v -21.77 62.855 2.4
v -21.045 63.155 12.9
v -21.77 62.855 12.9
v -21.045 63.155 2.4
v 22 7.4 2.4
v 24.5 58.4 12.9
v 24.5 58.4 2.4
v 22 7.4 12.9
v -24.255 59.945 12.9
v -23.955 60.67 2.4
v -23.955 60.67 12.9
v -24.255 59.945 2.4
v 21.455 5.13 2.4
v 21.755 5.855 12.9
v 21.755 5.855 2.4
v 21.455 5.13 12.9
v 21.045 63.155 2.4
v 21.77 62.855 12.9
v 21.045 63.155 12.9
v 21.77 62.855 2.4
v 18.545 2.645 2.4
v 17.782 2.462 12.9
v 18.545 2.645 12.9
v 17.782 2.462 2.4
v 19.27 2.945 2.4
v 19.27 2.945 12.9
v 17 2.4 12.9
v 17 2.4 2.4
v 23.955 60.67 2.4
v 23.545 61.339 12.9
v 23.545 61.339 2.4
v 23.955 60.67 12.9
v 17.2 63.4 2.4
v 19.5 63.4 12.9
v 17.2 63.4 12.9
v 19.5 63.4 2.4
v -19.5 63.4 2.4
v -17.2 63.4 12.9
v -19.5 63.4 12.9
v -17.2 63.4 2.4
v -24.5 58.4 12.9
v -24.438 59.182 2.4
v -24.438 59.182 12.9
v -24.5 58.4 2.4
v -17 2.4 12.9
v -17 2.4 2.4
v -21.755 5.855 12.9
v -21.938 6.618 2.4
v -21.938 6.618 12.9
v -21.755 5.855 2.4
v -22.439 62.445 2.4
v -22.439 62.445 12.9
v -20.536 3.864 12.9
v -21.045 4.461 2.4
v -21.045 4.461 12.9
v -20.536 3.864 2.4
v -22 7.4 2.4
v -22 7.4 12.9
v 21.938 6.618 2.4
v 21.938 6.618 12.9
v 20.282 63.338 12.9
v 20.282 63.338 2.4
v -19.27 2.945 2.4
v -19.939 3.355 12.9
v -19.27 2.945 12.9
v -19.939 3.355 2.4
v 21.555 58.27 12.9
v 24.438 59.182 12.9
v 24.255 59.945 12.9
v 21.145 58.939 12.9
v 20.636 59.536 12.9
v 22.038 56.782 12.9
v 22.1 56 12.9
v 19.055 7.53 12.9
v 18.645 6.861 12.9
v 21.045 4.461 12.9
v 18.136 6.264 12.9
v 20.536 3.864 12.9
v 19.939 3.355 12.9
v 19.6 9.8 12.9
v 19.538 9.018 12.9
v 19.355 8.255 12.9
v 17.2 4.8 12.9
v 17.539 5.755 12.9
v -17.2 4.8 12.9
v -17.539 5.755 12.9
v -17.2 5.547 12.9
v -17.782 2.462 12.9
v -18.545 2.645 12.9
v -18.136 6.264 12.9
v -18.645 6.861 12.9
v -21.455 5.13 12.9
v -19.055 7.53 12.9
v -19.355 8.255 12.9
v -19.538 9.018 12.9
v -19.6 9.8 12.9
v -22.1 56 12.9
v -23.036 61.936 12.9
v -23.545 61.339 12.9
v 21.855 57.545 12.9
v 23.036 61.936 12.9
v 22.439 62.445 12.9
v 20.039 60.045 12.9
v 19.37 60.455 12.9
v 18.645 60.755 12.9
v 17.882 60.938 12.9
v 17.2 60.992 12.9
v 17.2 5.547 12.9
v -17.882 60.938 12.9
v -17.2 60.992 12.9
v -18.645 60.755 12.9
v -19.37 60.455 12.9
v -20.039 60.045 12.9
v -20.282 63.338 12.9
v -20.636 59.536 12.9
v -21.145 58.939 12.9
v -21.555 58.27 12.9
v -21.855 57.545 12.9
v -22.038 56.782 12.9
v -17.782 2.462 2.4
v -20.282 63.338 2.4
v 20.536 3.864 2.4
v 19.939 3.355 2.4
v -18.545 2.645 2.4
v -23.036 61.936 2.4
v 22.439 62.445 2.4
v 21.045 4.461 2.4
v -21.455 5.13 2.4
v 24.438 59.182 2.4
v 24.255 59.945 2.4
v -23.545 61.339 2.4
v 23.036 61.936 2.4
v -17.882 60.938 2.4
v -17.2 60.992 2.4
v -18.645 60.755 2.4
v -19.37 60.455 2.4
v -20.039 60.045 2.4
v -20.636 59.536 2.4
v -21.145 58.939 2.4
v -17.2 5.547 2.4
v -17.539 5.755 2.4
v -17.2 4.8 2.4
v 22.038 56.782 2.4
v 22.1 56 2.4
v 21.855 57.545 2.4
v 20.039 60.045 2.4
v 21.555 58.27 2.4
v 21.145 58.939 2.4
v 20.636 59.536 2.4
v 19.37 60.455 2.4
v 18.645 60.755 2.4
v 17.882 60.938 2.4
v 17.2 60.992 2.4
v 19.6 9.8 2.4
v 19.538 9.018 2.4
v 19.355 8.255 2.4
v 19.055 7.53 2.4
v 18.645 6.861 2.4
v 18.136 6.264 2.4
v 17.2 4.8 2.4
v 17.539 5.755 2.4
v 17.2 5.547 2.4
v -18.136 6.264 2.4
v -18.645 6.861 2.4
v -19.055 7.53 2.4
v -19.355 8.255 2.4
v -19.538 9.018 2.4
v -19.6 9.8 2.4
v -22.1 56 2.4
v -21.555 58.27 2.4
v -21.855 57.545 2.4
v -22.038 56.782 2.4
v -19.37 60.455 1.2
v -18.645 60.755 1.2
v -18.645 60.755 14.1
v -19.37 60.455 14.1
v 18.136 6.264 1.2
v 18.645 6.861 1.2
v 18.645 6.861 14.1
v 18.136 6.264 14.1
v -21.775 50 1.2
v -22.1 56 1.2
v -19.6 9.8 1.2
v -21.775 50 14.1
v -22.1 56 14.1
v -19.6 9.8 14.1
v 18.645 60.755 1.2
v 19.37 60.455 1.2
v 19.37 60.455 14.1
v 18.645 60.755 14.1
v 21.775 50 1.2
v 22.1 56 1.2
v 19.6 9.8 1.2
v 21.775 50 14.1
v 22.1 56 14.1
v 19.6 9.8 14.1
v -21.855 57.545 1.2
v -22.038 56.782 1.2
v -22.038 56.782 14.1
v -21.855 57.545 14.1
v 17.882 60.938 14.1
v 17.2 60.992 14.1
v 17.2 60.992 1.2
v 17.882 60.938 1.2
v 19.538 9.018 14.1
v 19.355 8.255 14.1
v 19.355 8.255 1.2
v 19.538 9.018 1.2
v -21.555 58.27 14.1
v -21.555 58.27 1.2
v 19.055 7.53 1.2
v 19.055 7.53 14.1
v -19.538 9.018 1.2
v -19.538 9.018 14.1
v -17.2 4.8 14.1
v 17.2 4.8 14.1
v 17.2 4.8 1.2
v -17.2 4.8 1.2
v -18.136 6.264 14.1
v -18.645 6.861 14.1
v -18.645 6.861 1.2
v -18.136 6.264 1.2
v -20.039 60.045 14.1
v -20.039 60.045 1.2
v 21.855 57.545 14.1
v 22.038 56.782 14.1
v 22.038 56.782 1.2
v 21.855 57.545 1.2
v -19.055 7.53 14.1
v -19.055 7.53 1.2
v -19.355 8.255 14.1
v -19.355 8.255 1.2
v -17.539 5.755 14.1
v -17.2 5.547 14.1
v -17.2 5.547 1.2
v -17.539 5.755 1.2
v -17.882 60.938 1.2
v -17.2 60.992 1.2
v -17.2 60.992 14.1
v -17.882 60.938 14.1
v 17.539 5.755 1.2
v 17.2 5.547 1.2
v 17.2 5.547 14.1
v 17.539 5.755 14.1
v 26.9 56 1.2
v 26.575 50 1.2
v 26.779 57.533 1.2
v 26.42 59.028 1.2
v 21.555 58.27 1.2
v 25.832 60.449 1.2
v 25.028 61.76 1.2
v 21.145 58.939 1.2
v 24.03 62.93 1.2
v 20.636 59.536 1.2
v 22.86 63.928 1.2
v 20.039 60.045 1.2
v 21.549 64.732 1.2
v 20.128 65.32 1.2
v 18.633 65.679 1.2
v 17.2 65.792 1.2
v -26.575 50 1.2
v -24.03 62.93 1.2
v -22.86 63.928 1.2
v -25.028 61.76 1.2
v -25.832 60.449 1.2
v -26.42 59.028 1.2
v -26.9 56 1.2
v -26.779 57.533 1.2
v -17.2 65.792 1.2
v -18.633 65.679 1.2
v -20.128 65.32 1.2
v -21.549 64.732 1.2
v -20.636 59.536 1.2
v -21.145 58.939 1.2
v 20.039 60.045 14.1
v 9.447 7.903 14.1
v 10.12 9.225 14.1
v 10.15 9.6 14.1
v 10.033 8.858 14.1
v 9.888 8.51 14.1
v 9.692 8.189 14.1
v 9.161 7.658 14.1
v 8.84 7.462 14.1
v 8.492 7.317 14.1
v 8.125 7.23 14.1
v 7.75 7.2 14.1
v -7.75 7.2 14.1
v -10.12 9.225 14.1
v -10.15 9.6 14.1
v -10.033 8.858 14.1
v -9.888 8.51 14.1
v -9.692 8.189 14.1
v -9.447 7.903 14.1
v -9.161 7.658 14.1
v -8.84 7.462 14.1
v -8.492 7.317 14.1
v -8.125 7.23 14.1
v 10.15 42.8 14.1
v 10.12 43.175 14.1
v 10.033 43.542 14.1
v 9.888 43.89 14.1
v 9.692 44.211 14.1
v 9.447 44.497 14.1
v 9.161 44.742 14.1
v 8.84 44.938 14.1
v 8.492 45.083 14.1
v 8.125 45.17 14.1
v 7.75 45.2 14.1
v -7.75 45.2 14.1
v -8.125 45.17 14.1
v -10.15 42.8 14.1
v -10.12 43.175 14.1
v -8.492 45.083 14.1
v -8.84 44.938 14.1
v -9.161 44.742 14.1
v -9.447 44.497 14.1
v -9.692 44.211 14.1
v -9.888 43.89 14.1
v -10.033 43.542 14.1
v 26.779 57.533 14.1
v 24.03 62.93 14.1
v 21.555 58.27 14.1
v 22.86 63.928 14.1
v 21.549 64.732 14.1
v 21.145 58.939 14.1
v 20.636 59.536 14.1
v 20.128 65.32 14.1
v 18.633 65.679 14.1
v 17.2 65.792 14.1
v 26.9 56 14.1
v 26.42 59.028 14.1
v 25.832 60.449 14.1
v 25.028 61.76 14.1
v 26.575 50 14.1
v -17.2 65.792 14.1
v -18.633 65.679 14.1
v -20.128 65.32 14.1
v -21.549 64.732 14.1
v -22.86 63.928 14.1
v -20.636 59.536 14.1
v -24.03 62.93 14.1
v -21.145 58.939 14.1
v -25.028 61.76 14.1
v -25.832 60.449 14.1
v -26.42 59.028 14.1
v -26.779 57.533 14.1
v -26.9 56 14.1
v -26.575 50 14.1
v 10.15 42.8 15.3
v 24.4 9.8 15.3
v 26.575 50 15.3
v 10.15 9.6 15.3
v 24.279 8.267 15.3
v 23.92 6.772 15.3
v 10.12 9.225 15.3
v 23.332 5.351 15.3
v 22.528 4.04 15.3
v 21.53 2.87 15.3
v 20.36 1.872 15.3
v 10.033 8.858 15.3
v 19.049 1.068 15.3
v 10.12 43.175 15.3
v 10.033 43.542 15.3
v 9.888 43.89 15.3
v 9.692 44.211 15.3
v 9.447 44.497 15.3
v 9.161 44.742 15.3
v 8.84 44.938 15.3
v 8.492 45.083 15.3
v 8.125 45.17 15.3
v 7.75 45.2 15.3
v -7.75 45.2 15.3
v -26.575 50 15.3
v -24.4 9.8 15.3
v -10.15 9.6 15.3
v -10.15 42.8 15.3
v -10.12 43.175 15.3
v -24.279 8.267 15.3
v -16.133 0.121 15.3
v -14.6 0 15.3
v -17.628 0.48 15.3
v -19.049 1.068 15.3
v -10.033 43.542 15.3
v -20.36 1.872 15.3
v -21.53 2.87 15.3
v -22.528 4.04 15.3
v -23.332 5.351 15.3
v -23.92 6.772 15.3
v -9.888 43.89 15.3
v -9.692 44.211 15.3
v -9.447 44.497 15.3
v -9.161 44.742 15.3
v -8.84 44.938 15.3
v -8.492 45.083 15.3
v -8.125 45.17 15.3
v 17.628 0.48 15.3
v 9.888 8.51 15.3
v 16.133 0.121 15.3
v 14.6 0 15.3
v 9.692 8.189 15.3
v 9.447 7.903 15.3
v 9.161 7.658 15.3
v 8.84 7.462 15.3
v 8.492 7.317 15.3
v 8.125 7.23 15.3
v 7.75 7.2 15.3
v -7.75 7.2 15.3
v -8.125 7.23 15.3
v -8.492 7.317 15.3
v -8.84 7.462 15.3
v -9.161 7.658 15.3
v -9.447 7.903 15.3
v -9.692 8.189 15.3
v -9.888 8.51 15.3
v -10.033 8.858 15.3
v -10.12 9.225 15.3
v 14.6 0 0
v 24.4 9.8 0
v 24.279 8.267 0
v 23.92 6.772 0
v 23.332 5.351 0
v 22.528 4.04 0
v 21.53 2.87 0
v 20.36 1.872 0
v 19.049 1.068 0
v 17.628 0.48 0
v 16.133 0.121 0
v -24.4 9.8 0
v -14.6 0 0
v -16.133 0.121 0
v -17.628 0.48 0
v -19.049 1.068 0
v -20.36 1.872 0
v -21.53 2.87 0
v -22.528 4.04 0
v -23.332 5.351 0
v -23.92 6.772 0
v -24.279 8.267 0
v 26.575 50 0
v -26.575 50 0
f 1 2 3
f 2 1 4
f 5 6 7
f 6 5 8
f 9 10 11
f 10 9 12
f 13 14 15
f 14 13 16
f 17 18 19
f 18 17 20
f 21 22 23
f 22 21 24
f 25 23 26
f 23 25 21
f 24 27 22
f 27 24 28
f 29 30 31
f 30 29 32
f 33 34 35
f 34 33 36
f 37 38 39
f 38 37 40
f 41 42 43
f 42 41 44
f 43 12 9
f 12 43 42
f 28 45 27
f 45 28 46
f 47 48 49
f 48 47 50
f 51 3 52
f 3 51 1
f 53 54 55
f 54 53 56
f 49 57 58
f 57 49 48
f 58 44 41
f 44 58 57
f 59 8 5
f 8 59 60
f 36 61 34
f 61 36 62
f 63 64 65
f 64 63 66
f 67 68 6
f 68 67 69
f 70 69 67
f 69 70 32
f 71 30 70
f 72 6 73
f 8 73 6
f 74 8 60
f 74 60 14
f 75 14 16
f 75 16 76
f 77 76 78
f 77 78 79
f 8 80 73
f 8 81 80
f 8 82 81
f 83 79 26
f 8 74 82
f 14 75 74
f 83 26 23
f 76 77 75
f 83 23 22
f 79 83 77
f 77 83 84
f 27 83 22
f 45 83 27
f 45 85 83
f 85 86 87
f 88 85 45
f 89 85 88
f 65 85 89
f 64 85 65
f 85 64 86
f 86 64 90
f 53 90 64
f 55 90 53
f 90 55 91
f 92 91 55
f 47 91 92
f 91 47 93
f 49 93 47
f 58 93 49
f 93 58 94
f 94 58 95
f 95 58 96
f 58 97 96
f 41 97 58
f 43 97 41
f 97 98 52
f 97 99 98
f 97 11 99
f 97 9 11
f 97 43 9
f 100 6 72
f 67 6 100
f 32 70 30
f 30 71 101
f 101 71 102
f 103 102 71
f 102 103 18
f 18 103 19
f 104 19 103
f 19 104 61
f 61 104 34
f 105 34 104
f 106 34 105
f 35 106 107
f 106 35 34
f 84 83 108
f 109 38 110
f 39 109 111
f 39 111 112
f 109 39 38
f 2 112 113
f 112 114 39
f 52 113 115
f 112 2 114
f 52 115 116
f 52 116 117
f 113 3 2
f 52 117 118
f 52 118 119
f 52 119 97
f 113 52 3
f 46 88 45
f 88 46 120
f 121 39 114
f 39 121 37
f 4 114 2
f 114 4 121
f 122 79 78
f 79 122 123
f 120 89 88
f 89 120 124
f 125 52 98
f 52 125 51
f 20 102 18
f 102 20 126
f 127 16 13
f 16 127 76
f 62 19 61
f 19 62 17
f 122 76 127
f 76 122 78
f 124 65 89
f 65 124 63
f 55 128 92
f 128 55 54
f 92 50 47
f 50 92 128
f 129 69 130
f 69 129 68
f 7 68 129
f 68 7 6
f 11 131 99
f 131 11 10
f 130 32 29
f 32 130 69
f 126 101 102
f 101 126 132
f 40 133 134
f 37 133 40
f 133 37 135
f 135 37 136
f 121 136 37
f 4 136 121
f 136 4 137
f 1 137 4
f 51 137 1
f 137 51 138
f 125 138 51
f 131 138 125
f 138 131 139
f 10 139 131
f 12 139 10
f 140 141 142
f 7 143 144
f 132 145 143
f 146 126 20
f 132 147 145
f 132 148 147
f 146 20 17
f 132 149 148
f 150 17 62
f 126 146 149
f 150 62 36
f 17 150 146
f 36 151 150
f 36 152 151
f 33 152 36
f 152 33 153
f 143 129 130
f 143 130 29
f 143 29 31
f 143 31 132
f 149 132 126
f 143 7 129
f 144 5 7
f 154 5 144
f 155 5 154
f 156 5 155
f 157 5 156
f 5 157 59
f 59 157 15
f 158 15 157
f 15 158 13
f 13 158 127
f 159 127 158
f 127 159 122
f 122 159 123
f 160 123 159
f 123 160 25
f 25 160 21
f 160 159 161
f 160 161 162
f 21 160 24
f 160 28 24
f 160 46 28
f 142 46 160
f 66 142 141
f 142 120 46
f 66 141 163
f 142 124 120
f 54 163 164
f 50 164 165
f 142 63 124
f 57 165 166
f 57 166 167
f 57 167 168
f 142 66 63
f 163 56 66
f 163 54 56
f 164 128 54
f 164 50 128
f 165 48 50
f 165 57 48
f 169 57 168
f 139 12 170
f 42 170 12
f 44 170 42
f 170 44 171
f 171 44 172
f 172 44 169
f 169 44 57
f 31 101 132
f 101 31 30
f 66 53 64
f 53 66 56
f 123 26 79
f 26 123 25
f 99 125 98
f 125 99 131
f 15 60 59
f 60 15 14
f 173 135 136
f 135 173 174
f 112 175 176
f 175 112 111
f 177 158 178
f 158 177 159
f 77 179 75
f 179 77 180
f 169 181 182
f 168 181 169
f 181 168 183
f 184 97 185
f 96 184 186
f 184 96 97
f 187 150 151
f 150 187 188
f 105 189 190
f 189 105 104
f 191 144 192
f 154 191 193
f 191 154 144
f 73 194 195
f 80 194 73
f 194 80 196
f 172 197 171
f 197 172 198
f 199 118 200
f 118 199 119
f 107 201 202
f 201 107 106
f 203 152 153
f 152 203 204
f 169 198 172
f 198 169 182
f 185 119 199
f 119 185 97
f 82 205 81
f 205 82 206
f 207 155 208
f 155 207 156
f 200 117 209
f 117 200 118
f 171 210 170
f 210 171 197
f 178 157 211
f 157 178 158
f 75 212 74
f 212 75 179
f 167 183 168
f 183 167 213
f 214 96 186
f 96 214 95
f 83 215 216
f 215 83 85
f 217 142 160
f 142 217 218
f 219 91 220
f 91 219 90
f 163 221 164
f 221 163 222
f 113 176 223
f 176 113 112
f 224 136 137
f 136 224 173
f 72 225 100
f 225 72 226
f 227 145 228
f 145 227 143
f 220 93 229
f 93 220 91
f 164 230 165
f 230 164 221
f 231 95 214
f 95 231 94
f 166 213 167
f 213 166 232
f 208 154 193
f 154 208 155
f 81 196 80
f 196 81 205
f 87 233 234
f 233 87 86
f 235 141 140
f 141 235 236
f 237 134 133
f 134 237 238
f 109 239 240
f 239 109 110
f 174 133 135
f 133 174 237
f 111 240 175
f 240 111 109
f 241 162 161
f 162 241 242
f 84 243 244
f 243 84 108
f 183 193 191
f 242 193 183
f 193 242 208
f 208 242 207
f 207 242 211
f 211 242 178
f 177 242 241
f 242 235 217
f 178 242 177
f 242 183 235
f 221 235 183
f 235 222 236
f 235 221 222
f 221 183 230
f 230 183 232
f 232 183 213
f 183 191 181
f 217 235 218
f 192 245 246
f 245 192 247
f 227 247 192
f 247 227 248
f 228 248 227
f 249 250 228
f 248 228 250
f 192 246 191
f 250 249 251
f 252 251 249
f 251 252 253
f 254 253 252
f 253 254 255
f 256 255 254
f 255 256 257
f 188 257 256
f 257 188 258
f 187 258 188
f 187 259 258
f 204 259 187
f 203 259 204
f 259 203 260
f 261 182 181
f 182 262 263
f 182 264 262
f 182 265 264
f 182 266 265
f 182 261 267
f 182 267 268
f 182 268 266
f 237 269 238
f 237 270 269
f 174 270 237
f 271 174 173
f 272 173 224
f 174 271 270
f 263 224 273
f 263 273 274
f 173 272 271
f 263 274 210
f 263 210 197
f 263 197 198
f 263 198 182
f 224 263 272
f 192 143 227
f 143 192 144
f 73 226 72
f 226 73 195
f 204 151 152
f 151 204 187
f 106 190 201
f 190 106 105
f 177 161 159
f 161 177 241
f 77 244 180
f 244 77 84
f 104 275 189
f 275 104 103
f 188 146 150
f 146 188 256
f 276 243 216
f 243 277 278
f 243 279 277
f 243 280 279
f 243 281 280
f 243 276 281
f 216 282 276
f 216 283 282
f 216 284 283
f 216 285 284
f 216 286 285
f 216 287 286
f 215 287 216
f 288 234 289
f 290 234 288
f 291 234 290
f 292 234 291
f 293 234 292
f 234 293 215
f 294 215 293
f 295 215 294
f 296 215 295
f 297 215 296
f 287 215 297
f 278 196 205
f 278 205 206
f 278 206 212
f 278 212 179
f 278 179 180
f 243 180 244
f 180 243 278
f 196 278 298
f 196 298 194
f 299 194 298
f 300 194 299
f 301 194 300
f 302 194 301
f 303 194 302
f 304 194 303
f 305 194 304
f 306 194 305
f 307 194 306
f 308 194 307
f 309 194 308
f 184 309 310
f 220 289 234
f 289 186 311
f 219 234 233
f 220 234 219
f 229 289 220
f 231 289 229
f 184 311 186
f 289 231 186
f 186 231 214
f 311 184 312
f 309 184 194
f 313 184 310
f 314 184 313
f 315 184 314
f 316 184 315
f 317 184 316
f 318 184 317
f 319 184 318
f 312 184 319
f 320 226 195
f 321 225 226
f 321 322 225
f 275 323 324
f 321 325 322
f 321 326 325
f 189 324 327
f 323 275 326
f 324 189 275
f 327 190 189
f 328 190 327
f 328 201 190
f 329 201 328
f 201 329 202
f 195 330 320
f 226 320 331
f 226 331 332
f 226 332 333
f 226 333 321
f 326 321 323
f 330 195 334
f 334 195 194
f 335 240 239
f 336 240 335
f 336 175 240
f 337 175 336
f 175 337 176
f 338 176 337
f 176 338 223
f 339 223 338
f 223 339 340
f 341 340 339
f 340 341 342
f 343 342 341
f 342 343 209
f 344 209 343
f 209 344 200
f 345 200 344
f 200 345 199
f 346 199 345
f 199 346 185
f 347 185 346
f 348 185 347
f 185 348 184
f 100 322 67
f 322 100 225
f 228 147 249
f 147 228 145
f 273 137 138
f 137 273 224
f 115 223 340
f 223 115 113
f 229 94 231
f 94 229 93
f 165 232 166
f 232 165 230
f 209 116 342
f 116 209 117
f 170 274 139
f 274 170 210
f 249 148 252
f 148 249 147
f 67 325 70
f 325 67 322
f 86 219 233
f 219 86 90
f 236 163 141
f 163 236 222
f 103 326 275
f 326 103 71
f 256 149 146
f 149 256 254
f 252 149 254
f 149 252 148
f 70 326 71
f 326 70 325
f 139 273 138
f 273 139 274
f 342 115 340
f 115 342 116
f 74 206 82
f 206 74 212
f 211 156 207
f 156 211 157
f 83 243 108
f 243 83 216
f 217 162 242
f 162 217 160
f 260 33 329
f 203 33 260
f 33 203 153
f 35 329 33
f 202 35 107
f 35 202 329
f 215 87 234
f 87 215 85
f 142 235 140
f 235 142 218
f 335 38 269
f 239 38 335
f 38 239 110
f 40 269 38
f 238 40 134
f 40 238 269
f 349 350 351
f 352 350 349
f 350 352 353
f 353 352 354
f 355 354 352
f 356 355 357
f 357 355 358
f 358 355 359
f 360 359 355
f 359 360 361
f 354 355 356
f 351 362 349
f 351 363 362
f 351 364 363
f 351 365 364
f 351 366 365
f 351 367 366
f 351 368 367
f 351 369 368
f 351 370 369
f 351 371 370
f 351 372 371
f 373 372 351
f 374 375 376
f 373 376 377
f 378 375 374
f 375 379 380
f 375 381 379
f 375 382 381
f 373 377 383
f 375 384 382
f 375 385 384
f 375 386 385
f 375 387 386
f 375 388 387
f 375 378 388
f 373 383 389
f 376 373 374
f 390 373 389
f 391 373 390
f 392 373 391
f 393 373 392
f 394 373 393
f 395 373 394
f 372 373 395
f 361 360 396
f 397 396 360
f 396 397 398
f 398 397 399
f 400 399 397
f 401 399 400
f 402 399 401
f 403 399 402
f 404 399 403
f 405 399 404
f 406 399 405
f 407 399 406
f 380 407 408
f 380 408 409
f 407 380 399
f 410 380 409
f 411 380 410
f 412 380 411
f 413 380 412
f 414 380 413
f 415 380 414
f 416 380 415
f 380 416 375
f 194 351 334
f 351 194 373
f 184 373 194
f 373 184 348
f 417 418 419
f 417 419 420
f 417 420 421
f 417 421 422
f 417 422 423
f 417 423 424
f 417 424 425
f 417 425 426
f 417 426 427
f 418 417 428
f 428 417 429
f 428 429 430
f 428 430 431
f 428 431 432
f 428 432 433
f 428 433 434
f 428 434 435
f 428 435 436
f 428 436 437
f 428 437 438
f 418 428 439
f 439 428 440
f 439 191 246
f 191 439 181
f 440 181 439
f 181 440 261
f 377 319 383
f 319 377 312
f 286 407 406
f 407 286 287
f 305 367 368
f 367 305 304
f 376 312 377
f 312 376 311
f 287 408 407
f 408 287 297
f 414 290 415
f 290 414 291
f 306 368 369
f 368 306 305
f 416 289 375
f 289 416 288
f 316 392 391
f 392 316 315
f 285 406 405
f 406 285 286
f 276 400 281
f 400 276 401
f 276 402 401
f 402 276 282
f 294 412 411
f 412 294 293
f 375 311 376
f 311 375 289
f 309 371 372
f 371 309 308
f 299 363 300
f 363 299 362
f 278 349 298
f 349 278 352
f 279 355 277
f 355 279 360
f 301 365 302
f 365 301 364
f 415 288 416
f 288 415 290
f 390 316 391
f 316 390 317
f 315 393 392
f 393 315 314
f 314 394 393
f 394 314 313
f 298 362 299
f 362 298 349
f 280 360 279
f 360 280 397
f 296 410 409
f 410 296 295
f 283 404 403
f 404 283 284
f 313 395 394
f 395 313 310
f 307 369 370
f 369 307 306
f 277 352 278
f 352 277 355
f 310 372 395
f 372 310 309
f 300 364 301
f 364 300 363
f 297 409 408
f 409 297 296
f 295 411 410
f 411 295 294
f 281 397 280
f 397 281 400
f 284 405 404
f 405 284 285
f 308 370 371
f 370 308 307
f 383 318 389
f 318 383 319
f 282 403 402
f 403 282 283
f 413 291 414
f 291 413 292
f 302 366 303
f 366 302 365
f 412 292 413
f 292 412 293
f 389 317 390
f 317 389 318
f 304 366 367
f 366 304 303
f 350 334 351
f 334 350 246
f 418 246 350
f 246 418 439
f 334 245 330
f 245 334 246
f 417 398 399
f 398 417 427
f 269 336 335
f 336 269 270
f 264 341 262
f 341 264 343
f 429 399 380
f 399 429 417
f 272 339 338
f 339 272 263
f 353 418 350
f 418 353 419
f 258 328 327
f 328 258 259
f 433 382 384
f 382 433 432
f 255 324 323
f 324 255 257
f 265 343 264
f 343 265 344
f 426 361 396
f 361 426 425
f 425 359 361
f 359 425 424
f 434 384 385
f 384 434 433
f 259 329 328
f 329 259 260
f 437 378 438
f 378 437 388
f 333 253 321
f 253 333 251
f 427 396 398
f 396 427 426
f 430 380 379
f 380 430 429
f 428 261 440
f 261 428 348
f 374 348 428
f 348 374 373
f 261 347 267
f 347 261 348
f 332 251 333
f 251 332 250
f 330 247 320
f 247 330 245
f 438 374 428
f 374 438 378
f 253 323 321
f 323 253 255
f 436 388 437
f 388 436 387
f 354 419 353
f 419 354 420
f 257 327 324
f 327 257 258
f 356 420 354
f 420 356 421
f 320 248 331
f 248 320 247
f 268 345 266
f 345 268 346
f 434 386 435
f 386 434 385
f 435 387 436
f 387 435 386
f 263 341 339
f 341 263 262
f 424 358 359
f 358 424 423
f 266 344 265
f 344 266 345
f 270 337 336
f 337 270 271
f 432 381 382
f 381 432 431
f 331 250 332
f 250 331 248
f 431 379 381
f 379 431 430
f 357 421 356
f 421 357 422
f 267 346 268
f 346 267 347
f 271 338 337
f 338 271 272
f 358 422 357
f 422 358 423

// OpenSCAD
height = 61;
bottom_width = 44;
top_width = 49;
thickness = 10.5;

bottom_round = 5;
top_round = 10;

ring_offset = 14.3;

face_skin = 1.2;
side_skin = 2.4;

cover_height = 50;
hole = 1;  // 0 for no hole

$fn=40;

difference() {
    fob(
        height = height + side_skin * 2, 
        bottom_width = bottom_width + side_skin * 2, 
        top_width = top_width + side_skin * 2,
        thickness = thickness + face_skin * 4,
        bottom_round = bottom_round + side_skin * 2,
        top_round = top_round + side_skin * 2
    );

    union() {
        // inside cut-out for fob sides
        translate([0, side_skin, face_skin * 2]) {
            fob(
                height = height, 
                bottom_width = bottom_width, 
                top_width = top_width,
                thickness = thickness,
                bottom_round = bottom_round,
                top_round = top_round
            );
        }

        // inside cut-out for fob face
        translate([0, side_skin * 2, face_skin]) {
            fob(
                height = height - side_skin * 2,
                bottom_width = bottom_width - side_skin * 2,
                top_width = top_width - side_skin * 2,
                thickness = thickness + face_skin * 2,
                bottom_round = bottom_round,
                top_round = top_round
            );
        }

        // center cut-out for "fingers"
        translate([
            0 - bottom_width / 2 + side_skin * 2, 
            side_skin * 2, 
            face_skin
        ]) {
            cube([
                bottom_width - side_skin * 4,
                height + side_skin * 2,
                thickness + face_skin * 2
            ]);
        }
        
        // top cut-out of face 1
        translate([
            0 - top_width / 2 - side_skin, 
            cover_height, 
            thickness + face_skin * 3
        ]) {
            cube([
                top_width + side_skin * 2,
                height + side_skin * 2 - cover_height, 
                face_skin
            ]); 
        }

        // top cut-out of face 2
        translate([
            0 - top_width / 2 - side_skin, 
            cover_height, 
            0
        ]) {
            cube([
                top_width + side_skin * 2,
                height + side_skin * 2 - cover_height, 
                face_skin
            ]); 
        }
        
        // button cut-out
        if (hole) {
          translate([
              (top_width + bottom_width) / -12, side_skin * 4, face_skin
          ]) {
              minkowski() {
                  cube([
                      (top_width + bottom_width) / 6,
                      cover_height - side_skin * 7,
                      thickness + face_skin * 3
                  ]);
                  cylinder(r=side_skin);
              }
          }
        }
    }
}


module fob() {
    linear_extrude(height = thickness) {
        minkowski() {
            polygon(points = [
                [0 - bottom_width / 2 + bottom_round, 0 + bottom_round], 
                [bottom_width / 2 - bottom_round, 0 + bottom_round], 
                [top_width / 2 - bottom_round, height - bottom_round], 
                [0 - top_width / 2 + bottom_round, height - bottom_round]
            ]);
            circle(bottom_round);
        }
    }
}
